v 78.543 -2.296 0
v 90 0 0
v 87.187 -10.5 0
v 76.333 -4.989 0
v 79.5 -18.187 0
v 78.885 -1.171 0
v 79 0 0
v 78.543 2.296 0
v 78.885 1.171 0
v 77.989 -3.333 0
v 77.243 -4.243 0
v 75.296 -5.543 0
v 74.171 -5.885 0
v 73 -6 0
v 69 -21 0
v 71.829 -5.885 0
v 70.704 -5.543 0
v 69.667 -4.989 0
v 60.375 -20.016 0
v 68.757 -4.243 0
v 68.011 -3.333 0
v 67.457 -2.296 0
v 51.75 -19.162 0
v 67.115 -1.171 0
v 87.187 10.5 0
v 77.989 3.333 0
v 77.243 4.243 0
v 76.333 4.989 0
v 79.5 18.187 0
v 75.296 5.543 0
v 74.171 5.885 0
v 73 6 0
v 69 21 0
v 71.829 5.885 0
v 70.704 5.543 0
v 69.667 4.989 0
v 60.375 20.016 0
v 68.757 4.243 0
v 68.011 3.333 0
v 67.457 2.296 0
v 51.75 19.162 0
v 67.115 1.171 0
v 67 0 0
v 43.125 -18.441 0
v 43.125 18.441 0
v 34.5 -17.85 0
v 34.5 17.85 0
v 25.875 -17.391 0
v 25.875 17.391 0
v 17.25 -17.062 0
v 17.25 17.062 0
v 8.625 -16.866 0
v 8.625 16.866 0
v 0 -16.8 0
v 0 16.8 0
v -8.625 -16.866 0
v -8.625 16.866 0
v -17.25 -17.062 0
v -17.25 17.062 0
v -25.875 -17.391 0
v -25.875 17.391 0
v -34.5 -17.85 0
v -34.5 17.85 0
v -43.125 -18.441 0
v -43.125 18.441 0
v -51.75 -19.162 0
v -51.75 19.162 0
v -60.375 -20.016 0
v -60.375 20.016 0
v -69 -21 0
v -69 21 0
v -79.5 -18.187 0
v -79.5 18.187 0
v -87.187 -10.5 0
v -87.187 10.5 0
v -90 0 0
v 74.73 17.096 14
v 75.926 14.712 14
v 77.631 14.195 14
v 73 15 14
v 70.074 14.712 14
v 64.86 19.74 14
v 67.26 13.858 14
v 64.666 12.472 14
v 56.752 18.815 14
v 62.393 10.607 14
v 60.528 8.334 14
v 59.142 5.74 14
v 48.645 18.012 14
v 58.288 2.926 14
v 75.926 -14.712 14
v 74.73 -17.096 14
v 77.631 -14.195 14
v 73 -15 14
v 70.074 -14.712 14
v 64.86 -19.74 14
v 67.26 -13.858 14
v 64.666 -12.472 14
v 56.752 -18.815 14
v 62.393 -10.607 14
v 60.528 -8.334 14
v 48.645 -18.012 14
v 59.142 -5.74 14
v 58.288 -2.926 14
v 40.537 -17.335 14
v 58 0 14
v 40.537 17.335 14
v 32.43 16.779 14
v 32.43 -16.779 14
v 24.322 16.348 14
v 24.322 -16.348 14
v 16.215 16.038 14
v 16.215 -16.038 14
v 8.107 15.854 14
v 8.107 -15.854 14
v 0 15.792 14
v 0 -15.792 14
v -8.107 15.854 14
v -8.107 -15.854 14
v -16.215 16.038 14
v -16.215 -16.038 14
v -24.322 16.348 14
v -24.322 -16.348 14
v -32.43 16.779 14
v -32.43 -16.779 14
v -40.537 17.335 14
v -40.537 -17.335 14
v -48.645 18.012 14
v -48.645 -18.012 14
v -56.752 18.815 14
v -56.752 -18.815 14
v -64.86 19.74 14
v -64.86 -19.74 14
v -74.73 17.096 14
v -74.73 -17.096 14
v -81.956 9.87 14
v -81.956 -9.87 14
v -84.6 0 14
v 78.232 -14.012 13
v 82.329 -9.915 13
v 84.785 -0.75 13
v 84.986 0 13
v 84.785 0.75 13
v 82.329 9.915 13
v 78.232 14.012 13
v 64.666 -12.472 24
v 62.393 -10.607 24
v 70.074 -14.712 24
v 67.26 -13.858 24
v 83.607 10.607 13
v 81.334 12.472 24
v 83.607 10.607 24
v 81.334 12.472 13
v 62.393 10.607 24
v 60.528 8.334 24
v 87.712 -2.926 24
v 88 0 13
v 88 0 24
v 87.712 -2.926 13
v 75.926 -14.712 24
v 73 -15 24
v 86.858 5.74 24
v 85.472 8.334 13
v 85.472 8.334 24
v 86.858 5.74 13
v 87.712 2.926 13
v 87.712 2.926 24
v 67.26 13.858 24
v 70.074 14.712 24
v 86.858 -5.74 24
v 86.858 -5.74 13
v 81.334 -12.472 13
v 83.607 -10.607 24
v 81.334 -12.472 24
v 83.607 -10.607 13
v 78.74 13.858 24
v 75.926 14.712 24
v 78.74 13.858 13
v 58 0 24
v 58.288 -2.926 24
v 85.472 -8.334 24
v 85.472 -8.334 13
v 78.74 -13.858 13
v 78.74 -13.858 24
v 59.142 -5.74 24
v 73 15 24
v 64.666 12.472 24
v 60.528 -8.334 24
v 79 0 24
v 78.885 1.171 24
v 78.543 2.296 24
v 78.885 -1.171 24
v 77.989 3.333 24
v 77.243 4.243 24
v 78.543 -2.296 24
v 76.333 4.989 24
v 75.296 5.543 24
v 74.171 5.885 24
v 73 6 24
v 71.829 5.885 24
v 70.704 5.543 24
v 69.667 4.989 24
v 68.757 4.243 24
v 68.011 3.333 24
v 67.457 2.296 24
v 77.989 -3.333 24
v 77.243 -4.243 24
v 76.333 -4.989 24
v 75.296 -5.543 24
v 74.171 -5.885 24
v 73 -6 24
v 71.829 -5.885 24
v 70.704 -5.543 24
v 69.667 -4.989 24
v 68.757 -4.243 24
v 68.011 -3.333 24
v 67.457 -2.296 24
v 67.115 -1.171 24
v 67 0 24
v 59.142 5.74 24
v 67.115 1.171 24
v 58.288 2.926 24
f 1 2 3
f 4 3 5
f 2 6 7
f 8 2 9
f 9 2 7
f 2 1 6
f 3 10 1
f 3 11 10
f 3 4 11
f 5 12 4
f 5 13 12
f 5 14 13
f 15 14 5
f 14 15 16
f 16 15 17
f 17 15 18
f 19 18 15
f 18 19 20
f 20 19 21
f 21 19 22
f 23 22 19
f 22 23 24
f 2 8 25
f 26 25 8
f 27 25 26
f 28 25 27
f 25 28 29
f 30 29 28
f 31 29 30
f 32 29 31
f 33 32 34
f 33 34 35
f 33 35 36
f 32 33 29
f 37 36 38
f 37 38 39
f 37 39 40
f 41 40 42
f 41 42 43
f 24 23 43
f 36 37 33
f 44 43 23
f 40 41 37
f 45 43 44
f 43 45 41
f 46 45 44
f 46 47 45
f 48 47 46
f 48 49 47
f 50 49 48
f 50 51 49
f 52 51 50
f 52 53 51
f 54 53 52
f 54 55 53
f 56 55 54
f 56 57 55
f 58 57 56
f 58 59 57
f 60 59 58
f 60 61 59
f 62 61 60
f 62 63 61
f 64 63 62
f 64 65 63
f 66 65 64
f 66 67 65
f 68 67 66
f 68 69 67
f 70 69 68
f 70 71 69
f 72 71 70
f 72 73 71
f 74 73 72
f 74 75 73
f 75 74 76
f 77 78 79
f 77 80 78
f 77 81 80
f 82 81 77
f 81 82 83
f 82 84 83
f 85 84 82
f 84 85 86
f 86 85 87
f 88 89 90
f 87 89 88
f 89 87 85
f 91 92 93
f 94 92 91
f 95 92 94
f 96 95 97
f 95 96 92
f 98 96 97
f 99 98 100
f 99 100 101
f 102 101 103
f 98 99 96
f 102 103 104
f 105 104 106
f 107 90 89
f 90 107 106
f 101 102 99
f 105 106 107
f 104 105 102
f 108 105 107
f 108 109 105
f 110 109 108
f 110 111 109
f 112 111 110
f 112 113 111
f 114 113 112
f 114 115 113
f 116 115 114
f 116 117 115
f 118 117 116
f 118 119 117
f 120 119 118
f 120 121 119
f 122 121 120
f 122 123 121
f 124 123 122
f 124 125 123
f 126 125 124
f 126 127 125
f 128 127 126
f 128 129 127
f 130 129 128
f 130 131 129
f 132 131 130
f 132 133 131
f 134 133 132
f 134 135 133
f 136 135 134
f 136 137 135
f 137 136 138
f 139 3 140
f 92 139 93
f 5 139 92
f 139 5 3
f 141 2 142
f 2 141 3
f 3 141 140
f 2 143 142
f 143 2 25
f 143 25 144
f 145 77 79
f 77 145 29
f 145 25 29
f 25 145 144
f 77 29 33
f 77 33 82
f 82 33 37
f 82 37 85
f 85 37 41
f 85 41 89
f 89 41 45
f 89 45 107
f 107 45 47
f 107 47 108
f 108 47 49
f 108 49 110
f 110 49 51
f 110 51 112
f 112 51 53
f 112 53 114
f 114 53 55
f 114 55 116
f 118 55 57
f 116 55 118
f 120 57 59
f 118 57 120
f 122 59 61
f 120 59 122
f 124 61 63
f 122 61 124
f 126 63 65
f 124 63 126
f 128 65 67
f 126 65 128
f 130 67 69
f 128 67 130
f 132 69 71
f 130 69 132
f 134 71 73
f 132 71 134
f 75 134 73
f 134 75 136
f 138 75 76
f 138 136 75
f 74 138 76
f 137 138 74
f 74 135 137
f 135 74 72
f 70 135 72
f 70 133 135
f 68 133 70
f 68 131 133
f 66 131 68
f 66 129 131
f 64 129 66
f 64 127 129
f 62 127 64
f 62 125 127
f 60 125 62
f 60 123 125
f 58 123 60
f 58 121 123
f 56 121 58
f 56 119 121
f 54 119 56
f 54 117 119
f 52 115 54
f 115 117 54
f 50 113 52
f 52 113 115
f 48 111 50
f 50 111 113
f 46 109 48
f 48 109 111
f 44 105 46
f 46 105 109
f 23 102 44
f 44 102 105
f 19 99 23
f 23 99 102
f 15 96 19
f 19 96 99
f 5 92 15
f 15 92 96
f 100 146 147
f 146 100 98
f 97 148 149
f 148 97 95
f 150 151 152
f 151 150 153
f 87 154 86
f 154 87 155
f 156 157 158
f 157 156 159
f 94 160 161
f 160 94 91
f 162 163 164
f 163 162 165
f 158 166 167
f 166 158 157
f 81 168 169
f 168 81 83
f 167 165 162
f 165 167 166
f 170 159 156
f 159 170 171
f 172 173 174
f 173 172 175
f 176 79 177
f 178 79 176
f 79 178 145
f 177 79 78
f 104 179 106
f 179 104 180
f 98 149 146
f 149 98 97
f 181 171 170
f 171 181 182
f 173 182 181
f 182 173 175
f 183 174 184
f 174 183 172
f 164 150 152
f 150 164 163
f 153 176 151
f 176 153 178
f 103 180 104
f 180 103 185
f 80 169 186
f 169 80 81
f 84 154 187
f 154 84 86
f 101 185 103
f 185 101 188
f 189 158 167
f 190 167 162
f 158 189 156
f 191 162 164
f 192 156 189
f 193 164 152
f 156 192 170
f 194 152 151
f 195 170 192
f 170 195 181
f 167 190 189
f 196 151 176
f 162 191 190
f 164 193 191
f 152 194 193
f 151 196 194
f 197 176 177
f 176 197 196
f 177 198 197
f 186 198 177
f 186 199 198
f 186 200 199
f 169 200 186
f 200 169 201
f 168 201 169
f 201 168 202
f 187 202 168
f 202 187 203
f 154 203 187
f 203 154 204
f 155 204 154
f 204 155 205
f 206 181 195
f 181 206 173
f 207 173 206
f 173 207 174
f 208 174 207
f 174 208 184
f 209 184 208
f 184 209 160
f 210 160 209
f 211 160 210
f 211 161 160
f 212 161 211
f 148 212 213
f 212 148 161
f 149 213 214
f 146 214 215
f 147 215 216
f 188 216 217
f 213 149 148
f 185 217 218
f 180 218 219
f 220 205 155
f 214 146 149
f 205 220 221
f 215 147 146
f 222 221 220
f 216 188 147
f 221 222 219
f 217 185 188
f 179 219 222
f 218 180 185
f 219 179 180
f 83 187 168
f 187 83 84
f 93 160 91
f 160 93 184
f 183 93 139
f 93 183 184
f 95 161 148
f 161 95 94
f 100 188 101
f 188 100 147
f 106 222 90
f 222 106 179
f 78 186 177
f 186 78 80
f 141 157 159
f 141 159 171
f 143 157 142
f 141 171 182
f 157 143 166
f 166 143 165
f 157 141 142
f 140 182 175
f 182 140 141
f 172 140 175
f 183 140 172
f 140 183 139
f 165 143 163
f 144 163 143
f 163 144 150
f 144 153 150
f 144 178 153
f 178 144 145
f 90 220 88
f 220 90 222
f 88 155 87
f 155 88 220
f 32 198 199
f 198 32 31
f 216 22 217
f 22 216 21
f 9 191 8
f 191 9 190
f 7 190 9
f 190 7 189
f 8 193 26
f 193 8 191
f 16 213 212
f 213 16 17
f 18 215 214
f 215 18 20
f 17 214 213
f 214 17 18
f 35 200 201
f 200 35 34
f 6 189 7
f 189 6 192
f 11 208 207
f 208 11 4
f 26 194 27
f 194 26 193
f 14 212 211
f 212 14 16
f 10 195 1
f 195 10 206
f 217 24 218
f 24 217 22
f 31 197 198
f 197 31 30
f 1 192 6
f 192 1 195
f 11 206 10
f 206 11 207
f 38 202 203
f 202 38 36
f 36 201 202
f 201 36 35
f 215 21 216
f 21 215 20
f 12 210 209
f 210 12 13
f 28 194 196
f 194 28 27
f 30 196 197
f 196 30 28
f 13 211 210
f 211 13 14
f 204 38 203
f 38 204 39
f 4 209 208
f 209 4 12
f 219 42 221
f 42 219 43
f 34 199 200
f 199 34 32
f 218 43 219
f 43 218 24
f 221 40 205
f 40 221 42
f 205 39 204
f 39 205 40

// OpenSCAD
$fn = 32;

// ----------------------------------------------------------------------
// Handle: 180 x 42 mm grip, 14 mm thick
// ----------------------------------------------------------------------

// --- parameters (mm) ---
length = 180;             // grip length
width = 42;               // grip width
thickness = 14;           // grip thickness
waist = 0.8;              // width factor at the middle
draft = 0.94;             // top face scale of the extrusion
boss_d = 30;              // mounting boss diameter
boss_h = 10;              // mounting boss height
boss_hole_d = 12;         // screw clearance through the boss
boss_r = 73;              // boss centre from the grip centre

/* ergonomic grip outline, closed spline-like polygon in the XY plane */
grip = [[-69, 21], [-60.375, 20.016], [-51.75, 19.162], [-43.125, 18.441], [-34.5, 17.85], [-25.875, 17.391], [-17.25, 17.062], [-8.625, 16.866], [0, 16.8], [8.625, 16.866], [17.25, 17.062], [25.875, 17.391], [34.5, 17.85], [43.125, 18.441], [51.75, 19.162], [60.375, 20.016], [69, 21], [79.5, 18.187], [87.187, 10.5], [90, 0], [87.187, -10.5], [79.5, -18.187], [69, -21], [69, -21], [60.375, -20.016], [51.75, -19.162], [43.125, -18.441], [34.5, -17.85], [25.875, -17.391], [17.25, -17.062], [8.625, -16.866], [0, -16.8], [-8.625, -16.866], [-17.25, -17.062], [-25.875, -17.391], [-34.5, -17.85], [-43.125, -18.441], [-51.75, -19.162], [-60.375, -20.016], [-69, -21], [-79.5, -18.187], [-87.187, -10.5], [-90, 0], [-87.187, 10.5], [-79.5, 18.187], [-69, 21]];

module grip_body() {
  linear_extrude(height = thickness, scale = draft) polygon(grip);
}

module boss_body() {
  /* sunk 1 mm into the grip so the joint overlaps */
  translate([boss_r, 0, thickness - 1]) cylinder(h = boss_h + 1, d = boss_d);
}

difference() {
  union() {
    grip_body();
    boss_body();
  }
  translate([boss_r, 0, -1]) cylinder(h = thickness + boss_h + 2, d = boss_hole_d);
}
